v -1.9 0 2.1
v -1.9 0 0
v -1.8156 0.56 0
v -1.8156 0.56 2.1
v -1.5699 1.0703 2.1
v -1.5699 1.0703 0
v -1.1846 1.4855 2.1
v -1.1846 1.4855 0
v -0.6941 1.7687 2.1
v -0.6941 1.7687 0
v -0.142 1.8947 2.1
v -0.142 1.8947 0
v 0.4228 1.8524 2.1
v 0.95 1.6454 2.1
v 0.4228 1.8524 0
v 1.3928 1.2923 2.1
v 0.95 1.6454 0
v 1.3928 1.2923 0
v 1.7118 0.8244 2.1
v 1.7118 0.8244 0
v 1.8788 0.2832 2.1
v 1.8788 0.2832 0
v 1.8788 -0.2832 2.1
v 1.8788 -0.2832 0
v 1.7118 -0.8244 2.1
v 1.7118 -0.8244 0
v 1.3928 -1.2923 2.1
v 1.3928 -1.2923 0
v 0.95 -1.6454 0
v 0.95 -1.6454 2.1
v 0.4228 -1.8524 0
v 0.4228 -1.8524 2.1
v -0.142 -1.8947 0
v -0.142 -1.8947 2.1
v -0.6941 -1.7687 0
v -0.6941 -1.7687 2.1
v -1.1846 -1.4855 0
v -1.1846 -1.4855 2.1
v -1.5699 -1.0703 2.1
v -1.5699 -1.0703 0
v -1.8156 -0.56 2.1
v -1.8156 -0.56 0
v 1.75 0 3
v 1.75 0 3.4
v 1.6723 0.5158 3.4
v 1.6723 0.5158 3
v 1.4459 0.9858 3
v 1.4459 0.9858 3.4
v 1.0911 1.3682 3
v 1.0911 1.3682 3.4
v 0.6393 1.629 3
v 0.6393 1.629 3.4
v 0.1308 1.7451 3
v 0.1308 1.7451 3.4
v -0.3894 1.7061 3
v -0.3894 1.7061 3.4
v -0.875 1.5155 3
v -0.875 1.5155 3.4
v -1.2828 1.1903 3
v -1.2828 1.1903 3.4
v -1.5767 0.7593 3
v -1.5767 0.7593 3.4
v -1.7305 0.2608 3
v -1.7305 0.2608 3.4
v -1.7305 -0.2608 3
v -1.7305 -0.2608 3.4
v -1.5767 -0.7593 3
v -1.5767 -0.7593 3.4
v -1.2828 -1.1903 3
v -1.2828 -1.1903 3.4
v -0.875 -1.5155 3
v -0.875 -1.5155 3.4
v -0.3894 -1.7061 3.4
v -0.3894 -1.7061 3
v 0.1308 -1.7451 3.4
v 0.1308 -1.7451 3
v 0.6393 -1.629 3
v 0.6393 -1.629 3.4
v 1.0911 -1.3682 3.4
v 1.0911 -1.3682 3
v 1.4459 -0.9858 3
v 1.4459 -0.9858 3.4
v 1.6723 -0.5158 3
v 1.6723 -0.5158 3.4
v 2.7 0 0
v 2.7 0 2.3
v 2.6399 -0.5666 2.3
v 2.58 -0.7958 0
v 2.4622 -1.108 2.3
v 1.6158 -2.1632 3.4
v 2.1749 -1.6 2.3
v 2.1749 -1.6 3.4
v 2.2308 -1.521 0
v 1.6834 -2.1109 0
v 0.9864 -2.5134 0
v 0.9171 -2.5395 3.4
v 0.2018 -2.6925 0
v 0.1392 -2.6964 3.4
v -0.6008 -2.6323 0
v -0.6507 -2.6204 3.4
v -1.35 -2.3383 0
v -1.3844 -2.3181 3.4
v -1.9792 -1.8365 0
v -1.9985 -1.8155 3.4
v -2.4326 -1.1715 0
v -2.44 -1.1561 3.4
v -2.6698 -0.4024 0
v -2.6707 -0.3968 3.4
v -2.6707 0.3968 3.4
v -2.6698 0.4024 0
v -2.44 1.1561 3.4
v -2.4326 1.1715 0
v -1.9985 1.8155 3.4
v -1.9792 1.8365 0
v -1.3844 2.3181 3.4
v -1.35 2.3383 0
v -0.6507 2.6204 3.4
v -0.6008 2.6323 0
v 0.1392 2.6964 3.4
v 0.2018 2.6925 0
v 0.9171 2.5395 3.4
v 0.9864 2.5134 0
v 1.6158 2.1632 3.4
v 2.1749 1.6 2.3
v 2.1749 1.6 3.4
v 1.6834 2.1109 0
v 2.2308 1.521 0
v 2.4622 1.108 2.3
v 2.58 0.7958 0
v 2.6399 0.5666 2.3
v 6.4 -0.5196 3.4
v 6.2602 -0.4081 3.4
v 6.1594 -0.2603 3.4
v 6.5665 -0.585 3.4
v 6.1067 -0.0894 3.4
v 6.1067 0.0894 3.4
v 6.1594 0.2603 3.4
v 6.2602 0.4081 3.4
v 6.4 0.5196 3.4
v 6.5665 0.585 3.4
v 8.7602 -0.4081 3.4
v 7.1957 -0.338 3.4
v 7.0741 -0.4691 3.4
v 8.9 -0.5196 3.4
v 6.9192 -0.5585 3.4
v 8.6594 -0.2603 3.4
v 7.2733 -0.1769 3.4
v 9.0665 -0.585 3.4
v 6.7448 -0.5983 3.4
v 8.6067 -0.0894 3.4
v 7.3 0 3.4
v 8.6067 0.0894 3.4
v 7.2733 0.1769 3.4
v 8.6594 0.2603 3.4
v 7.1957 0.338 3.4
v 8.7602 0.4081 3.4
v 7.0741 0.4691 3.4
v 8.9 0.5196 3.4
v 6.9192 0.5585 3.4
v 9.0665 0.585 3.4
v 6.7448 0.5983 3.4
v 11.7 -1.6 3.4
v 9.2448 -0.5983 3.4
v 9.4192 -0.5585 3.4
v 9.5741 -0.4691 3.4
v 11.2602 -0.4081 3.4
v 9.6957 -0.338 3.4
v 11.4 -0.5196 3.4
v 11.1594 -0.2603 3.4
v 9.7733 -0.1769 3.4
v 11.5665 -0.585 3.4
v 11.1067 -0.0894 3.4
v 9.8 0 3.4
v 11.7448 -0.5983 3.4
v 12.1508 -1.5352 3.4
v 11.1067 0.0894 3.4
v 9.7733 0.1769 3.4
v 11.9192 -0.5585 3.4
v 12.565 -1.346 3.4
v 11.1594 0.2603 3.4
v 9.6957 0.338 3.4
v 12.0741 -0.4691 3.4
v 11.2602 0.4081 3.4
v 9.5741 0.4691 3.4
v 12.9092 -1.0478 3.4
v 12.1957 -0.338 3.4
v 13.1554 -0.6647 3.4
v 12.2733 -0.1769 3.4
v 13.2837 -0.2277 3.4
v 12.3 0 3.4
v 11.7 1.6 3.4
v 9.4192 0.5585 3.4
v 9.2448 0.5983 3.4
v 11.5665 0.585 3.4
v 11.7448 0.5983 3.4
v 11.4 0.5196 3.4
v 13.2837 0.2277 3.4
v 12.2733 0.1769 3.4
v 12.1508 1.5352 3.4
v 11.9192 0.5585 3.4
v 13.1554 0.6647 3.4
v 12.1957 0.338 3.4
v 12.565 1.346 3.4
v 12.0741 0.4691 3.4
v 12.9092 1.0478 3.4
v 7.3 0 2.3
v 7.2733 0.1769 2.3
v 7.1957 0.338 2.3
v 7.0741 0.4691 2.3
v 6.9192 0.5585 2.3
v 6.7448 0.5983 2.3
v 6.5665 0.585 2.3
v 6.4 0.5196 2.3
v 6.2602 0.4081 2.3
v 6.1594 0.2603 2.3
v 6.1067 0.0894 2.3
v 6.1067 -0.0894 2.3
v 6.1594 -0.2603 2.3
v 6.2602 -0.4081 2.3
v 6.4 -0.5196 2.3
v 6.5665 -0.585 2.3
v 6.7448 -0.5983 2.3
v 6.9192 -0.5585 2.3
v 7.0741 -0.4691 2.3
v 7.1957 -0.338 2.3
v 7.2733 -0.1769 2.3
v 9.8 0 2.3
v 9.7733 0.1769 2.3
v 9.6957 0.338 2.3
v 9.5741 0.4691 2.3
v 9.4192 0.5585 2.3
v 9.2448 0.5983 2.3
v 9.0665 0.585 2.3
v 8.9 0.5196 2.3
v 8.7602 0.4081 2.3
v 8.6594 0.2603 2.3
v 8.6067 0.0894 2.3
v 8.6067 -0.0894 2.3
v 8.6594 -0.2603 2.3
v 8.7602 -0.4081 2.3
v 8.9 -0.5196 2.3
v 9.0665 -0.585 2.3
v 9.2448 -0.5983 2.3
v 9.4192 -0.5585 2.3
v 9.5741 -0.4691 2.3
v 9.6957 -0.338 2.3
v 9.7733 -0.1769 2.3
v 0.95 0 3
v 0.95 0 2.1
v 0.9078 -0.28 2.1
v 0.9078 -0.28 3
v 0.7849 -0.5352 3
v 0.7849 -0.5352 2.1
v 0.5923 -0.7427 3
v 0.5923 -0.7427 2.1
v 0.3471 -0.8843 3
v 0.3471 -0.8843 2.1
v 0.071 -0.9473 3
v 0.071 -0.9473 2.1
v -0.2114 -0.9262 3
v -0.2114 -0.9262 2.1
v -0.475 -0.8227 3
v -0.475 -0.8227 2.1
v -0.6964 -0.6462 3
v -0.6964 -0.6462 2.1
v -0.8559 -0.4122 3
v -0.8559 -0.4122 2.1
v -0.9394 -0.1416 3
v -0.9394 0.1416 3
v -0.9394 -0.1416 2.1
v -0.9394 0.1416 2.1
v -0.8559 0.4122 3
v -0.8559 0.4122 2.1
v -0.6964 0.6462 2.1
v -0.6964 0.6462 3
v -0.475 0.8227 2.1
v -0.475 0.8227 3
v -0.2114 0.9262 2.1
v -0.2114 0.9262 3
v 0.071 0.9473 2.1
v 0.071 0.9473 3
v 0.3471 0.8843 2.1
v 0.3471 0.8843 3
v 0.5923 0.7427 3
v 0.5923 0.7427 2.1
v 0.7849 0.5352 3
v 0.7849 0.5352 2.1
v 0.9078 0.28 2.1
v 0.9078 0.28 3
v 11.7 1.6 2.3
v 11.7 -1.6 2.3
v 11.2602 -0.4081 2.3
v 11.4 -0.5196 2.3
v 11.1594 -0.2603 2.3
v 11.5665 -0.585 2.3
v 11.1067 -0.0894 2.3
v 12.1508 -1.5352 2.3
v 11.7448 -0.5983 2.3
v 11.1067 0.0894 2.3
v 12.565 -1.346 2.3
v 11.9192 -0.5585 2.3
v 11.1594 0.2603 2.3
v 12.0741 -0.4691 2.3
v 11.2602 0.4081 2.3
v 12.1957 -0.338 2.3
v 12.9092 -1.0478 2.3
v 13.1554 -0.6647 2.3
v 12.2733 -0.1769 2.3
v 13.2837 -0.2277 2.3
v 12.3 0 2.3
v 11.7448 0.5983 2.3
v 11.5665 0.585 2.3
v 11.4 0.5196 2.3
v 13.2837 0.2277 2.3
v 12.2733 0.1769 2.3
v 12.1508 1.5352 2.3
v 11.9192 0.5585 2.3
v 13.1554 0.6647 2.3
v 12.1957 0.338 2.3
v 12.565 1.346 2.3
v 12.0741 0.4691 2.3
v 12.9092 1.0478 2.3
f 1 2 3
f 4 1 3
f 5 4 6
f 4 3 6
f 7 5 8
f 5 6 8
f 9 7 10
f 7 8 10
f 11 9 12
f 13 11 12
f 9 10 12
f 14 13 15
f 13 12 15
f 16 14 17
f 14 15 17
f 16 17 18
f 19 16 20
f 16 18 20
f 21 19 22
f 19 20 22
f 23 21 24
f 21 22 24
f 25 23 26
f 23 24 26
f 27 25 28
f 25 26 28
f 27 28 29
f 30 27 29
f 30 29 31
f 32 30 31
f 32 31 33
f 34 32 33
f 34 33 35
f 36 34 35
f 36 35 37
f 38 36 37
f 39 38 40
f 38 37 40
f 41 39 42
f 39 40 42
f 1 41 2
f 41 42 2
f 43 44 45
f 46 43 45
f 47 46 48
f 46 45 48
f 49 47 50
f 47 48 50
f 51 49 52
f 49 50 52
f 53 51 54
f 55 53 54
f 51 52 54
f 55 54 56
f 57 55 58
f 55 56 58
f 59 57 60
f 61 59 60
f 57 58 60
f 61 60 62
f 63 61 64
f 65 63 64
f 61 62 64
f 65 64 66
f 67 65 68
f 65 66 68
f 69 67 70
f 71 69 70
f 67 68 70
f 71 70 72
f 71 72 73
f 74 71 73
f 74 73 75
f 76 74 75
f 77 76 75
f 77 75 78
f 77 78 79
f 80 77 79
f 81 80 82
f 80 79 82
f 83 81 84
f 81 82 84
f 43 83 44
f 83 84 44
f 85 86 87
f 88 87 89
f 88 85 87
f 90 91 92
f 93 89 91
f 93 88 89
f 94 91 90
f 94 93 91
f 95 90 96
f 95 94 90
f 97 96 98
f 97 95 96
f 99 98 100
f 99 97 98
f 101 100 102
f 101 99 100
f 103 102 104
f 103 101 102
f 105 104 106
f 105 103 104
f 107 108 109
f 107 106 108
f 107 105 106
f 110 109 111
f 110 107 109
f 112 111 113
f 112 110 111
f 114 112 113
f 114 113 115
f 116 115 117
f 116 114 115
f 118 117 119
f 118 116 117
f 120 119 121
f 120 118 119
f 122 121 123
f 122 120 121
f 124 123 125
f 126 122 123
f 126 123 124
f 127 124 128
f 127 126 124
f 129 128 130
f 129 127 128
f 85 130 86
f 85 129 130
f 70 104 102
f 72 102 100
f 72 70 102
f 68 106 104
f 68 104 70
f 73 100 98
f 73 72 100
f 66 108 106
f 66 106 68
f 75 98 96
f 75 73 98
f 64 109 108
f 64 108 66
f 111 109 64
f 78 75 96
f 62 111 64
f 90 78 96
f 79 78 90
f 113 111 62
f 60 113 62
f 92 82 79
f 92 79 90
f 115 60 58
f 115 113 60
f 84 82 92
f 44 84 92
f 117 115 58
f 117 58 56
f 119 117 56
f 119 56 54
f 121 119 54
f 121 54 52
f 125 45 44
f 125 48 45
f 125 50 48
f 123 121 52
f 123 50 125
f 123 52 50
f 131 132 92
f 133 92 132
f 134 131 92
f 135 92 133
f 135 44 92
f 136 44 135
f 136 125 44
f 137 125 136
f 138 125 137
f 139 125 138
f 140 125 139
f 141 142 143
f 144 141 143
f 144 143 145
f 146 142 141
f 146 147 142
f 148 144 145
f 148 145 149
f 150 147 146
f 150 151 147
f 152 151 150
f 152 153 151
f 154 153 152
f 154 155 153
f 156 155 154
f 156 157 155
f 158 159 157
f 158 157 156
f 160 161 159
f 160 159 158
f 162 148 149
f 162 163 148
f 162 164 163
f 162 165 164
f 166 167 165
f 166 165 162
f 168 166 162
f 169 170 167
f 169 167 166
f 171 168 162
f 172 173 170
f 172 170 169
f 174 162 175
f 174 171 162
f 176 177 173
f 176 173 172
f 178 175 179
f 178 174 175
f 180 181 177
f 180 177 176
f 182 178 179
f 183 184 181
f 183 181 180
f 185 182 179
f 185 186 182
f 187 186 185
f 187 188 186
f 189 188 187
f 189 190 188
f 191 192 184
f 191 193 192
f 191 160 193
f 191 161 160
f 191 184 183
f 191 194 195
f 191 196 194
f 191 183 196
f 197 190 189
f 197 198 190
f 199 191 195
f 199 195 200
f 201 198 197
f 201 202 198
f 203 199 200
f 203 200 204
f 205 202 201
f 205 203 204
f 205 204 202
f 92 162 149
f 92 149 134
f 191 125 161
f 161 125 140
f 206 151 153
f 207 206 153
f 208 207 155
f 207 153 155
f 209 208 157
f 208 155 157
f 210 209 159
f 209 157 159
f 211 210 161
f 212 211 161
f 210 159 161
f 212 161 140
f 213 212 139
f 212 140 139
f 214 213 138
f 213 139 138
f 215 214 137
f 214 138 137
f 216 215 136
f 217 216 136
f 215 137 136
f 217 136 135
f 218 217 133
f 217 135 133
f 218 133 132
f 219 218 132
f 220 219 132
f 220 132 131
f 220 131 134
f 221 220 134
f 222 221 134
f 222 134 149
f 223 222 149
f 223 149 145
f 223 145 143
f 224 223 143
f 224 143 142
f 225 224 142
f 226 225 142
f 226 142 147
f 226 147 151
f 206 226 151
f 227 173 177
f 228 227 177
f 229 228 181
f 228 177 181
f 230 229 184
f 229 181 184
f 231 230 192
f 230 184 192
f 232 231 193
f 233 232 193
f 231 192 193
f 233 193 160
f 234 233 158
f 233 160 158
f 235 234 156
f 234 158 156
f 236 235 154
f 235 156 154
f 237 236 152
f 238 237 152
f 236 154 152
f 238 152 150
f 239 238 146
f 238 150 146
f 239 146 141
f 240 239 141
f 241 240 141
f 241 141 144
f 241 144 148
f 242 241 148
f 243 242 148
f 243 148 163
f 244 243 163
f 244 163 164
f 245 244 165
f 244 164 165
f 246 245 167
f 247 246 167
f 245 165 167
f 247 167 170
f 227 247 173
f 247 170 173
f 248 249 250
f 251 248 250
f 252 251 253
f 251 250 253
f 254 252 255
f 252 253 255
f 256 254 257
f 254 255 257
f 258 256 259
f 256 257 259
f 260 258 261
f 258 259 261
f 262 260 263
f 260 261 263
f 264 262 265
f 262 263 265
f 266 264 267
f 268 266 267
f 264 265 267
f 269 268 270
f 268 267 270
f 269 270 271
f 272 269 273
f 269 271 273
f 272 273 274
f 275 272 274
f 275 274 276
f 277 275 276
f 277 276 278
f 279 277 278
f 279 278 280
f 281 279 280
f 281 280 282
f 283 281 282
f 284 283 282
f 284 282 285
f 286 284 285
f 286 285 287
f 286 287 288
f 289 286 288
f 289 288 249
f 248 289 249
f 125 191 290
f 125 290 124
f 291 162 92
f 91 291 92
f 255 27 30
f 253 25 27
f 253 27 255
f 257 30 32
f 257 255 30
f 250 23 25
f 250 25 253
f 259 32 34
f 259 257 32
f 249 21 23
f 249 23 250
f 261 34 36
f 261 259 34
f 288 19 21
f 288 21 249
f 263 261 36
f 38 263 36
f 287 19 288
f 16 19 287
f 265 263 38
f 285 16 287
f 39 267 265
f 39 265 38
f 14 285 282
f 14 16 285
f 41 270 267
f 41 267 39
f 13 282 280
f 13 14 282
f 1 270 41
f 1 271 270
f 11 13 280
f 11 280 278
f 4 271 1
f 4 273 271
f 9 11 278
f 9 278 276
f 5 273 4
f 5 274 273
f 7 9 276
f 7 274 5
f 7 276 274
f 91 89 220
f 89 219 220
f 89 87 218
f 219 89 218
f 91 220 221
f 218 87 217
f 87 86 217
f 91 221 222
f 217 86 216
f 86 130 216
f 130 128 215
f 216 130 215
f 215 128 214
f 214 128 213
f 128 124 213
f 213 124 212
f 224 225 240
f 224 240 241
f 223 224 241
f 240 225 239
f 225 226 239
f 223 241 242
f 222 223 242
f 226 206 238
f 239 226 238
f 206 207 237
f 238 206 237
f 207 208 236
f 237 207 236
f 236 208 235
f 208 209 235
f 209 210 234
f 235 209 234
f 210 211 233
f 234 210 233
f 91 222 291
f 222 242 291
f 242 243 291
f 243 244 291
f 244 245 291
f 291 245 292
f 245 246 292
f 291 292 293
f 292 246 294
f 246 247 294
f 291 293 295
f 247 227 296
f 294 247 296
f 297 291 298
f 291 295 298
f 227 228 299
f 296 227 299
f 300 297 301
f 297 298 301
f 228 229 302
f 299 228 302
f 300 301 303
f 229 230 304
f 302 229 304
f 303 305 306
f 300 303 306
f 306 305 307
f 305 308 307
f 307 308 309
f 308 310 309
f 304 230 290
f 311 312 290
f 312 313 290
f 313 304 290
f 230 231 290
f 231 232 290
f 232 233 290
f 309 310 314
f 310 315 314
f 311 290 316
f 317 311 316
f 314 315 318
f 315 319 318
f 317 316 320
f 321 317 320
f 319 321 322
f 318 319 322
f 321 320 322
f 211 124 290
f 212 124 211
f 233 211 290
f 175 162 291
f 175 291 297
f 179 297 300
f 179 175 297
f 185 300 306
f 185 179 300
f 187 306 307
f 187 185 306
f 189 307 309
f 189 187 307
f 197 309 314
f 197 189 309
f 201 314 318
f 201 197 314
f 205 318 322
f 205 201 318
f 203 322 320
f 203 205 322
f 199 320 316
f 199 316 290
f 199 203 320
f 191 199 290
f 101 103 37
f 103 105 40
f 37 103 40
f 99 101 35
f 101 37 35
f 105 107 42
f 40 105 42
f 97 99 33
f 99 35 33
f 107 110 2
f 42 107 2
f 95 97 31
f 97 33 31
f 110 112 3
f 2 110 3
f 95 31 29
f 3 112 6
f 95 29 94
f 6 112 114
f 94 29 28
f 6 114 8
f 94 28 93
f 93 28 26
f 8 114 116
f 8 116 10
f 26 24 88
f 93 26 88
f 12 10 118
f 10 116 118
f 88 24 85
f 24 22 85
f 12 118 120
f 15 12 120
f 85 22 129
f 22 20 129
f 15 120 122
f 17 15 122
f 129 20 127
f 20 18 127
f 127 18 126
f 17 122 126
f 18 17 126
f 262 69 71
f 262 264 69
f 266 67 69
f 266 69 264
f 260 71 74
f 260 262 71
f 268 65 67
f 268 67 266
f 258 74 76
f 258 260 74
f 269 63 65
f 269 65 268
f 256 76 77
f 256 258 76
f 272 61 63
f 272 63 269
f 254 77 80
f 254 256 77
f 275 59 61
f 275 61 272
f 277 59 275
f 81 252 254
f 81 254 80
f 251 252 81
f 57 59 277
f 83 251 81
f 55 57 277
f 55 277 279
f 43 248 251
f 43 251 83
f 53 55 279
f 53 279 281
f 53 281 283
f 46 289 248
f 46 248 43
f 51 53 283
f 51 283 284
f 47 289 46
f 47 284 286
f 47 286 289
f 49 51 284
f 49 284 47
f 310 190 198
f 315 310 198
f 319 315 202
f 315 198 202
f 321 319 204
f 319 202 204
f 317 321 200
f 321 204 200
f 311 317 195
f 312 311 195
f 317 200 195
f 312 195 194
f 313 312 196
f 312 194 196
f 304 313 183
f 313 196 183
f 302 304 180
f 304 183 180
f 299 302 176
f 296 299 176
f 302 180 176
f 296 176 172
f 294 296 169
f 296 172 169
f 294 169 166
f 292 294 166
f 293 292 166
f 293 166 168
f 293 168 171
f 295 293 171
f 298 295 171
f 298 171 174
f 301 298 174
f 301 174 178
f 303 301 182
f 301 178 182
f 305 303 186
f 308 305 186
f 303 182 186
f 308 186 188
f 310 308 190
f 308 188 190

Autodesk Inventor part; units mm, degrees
ref_plane "YZ Plane" through (0, 0, 0) normal (1, 0, 0) x (0, 1, 0)
ref_plane "XZ Plane" through (0, 0, 0) normal (0, 1, 0) x (-1, 0, 0)
ref_plane "XY Plane" through (0, 0, 0) normal (0, 0, 1) x (1, 0, 0)
sketch "スケッチ1" plane through (0, 0, 0) normal (0, 0, 1) x (1, 0, 0)
  circle A0 centre (0, 0) radius 2.7
  circle A1 centre (0, 0) radius 0.95
  dimension "d0" = 5.4
  dimension "d1" = 1.9
extrude "押し出し1" add sketch "スケッチ1" along normal blind 3.4
sketch "スケッチ2" plane through (0, 0, 3.4) normal (0, 0, 1) x (1, 0, 0)
  circle A0 centre (0, 0) radius 1.75
  dimension "d4" = 3.5
extrude "押し出し2" cut sketch "スケッチ2" against normal blind 0.4
sketch "スケッチ3" plane through (0, 0, 0) normal (0, 0, -1) x (-1, 0, 0)
  circle A0 centre (0, 0) radius 0.95 projected
  circle A1 centre (0, 0) radius 1.9
  dimension "d7" = 3.8
extrude "押し出し3" cut sketch "スケッチ3" against normal blind 2.1
sketch "スケッチ4" plane through (0, 0, 3.4) normal (0, 0, 1) x (1, 0, 0)
  arc A0 (11.7, -1.6) -> (11.7, 1.6) centre (11.7, 0) ccw
  line L0 (11.7, 1.6) -> (2.1749, 1.6)
  circle A1 centre (0, 0) radius 2.7 projected
  line L1 (11.7, -1.6) -> (2.1749, -1.6)
  circle A2 centre (0, 0) radius 2.7 projected
  arc A3 (2.1749, -1.6) -> (2.1749, 1.6) centre (0, 0) ccw
  dimension "d10" = 11.7
  dimension "d11" = 3.2
extrude "押し出し4" add sketch "スケッチ4" against normal blind 1.1 contours L1 A1 L0 A0
sketch "スケッチ5" plane through (0, 0, 3.4) normal (0, 0, 1) x (1, 0, 0)
  arc A0 (11.7, -1.6) -> (11.7, 1.6) centre (11.7, 0) ccw projected
  circle A1 centre (11.7, 0) radius 0.6
  circle A2 centre (9.2, 0) radius 0.6
  circle A3 centre (6.7, 0) radius 0.6
  point P0 (0, 0)
  dimension "d14" = 1.2
  dimension "d15" = 2.5
  dimension "d16" = 2.5
extrude "押し出し5" cut sketch "スケッチ5" against normal up to next
properties part number "hone"
